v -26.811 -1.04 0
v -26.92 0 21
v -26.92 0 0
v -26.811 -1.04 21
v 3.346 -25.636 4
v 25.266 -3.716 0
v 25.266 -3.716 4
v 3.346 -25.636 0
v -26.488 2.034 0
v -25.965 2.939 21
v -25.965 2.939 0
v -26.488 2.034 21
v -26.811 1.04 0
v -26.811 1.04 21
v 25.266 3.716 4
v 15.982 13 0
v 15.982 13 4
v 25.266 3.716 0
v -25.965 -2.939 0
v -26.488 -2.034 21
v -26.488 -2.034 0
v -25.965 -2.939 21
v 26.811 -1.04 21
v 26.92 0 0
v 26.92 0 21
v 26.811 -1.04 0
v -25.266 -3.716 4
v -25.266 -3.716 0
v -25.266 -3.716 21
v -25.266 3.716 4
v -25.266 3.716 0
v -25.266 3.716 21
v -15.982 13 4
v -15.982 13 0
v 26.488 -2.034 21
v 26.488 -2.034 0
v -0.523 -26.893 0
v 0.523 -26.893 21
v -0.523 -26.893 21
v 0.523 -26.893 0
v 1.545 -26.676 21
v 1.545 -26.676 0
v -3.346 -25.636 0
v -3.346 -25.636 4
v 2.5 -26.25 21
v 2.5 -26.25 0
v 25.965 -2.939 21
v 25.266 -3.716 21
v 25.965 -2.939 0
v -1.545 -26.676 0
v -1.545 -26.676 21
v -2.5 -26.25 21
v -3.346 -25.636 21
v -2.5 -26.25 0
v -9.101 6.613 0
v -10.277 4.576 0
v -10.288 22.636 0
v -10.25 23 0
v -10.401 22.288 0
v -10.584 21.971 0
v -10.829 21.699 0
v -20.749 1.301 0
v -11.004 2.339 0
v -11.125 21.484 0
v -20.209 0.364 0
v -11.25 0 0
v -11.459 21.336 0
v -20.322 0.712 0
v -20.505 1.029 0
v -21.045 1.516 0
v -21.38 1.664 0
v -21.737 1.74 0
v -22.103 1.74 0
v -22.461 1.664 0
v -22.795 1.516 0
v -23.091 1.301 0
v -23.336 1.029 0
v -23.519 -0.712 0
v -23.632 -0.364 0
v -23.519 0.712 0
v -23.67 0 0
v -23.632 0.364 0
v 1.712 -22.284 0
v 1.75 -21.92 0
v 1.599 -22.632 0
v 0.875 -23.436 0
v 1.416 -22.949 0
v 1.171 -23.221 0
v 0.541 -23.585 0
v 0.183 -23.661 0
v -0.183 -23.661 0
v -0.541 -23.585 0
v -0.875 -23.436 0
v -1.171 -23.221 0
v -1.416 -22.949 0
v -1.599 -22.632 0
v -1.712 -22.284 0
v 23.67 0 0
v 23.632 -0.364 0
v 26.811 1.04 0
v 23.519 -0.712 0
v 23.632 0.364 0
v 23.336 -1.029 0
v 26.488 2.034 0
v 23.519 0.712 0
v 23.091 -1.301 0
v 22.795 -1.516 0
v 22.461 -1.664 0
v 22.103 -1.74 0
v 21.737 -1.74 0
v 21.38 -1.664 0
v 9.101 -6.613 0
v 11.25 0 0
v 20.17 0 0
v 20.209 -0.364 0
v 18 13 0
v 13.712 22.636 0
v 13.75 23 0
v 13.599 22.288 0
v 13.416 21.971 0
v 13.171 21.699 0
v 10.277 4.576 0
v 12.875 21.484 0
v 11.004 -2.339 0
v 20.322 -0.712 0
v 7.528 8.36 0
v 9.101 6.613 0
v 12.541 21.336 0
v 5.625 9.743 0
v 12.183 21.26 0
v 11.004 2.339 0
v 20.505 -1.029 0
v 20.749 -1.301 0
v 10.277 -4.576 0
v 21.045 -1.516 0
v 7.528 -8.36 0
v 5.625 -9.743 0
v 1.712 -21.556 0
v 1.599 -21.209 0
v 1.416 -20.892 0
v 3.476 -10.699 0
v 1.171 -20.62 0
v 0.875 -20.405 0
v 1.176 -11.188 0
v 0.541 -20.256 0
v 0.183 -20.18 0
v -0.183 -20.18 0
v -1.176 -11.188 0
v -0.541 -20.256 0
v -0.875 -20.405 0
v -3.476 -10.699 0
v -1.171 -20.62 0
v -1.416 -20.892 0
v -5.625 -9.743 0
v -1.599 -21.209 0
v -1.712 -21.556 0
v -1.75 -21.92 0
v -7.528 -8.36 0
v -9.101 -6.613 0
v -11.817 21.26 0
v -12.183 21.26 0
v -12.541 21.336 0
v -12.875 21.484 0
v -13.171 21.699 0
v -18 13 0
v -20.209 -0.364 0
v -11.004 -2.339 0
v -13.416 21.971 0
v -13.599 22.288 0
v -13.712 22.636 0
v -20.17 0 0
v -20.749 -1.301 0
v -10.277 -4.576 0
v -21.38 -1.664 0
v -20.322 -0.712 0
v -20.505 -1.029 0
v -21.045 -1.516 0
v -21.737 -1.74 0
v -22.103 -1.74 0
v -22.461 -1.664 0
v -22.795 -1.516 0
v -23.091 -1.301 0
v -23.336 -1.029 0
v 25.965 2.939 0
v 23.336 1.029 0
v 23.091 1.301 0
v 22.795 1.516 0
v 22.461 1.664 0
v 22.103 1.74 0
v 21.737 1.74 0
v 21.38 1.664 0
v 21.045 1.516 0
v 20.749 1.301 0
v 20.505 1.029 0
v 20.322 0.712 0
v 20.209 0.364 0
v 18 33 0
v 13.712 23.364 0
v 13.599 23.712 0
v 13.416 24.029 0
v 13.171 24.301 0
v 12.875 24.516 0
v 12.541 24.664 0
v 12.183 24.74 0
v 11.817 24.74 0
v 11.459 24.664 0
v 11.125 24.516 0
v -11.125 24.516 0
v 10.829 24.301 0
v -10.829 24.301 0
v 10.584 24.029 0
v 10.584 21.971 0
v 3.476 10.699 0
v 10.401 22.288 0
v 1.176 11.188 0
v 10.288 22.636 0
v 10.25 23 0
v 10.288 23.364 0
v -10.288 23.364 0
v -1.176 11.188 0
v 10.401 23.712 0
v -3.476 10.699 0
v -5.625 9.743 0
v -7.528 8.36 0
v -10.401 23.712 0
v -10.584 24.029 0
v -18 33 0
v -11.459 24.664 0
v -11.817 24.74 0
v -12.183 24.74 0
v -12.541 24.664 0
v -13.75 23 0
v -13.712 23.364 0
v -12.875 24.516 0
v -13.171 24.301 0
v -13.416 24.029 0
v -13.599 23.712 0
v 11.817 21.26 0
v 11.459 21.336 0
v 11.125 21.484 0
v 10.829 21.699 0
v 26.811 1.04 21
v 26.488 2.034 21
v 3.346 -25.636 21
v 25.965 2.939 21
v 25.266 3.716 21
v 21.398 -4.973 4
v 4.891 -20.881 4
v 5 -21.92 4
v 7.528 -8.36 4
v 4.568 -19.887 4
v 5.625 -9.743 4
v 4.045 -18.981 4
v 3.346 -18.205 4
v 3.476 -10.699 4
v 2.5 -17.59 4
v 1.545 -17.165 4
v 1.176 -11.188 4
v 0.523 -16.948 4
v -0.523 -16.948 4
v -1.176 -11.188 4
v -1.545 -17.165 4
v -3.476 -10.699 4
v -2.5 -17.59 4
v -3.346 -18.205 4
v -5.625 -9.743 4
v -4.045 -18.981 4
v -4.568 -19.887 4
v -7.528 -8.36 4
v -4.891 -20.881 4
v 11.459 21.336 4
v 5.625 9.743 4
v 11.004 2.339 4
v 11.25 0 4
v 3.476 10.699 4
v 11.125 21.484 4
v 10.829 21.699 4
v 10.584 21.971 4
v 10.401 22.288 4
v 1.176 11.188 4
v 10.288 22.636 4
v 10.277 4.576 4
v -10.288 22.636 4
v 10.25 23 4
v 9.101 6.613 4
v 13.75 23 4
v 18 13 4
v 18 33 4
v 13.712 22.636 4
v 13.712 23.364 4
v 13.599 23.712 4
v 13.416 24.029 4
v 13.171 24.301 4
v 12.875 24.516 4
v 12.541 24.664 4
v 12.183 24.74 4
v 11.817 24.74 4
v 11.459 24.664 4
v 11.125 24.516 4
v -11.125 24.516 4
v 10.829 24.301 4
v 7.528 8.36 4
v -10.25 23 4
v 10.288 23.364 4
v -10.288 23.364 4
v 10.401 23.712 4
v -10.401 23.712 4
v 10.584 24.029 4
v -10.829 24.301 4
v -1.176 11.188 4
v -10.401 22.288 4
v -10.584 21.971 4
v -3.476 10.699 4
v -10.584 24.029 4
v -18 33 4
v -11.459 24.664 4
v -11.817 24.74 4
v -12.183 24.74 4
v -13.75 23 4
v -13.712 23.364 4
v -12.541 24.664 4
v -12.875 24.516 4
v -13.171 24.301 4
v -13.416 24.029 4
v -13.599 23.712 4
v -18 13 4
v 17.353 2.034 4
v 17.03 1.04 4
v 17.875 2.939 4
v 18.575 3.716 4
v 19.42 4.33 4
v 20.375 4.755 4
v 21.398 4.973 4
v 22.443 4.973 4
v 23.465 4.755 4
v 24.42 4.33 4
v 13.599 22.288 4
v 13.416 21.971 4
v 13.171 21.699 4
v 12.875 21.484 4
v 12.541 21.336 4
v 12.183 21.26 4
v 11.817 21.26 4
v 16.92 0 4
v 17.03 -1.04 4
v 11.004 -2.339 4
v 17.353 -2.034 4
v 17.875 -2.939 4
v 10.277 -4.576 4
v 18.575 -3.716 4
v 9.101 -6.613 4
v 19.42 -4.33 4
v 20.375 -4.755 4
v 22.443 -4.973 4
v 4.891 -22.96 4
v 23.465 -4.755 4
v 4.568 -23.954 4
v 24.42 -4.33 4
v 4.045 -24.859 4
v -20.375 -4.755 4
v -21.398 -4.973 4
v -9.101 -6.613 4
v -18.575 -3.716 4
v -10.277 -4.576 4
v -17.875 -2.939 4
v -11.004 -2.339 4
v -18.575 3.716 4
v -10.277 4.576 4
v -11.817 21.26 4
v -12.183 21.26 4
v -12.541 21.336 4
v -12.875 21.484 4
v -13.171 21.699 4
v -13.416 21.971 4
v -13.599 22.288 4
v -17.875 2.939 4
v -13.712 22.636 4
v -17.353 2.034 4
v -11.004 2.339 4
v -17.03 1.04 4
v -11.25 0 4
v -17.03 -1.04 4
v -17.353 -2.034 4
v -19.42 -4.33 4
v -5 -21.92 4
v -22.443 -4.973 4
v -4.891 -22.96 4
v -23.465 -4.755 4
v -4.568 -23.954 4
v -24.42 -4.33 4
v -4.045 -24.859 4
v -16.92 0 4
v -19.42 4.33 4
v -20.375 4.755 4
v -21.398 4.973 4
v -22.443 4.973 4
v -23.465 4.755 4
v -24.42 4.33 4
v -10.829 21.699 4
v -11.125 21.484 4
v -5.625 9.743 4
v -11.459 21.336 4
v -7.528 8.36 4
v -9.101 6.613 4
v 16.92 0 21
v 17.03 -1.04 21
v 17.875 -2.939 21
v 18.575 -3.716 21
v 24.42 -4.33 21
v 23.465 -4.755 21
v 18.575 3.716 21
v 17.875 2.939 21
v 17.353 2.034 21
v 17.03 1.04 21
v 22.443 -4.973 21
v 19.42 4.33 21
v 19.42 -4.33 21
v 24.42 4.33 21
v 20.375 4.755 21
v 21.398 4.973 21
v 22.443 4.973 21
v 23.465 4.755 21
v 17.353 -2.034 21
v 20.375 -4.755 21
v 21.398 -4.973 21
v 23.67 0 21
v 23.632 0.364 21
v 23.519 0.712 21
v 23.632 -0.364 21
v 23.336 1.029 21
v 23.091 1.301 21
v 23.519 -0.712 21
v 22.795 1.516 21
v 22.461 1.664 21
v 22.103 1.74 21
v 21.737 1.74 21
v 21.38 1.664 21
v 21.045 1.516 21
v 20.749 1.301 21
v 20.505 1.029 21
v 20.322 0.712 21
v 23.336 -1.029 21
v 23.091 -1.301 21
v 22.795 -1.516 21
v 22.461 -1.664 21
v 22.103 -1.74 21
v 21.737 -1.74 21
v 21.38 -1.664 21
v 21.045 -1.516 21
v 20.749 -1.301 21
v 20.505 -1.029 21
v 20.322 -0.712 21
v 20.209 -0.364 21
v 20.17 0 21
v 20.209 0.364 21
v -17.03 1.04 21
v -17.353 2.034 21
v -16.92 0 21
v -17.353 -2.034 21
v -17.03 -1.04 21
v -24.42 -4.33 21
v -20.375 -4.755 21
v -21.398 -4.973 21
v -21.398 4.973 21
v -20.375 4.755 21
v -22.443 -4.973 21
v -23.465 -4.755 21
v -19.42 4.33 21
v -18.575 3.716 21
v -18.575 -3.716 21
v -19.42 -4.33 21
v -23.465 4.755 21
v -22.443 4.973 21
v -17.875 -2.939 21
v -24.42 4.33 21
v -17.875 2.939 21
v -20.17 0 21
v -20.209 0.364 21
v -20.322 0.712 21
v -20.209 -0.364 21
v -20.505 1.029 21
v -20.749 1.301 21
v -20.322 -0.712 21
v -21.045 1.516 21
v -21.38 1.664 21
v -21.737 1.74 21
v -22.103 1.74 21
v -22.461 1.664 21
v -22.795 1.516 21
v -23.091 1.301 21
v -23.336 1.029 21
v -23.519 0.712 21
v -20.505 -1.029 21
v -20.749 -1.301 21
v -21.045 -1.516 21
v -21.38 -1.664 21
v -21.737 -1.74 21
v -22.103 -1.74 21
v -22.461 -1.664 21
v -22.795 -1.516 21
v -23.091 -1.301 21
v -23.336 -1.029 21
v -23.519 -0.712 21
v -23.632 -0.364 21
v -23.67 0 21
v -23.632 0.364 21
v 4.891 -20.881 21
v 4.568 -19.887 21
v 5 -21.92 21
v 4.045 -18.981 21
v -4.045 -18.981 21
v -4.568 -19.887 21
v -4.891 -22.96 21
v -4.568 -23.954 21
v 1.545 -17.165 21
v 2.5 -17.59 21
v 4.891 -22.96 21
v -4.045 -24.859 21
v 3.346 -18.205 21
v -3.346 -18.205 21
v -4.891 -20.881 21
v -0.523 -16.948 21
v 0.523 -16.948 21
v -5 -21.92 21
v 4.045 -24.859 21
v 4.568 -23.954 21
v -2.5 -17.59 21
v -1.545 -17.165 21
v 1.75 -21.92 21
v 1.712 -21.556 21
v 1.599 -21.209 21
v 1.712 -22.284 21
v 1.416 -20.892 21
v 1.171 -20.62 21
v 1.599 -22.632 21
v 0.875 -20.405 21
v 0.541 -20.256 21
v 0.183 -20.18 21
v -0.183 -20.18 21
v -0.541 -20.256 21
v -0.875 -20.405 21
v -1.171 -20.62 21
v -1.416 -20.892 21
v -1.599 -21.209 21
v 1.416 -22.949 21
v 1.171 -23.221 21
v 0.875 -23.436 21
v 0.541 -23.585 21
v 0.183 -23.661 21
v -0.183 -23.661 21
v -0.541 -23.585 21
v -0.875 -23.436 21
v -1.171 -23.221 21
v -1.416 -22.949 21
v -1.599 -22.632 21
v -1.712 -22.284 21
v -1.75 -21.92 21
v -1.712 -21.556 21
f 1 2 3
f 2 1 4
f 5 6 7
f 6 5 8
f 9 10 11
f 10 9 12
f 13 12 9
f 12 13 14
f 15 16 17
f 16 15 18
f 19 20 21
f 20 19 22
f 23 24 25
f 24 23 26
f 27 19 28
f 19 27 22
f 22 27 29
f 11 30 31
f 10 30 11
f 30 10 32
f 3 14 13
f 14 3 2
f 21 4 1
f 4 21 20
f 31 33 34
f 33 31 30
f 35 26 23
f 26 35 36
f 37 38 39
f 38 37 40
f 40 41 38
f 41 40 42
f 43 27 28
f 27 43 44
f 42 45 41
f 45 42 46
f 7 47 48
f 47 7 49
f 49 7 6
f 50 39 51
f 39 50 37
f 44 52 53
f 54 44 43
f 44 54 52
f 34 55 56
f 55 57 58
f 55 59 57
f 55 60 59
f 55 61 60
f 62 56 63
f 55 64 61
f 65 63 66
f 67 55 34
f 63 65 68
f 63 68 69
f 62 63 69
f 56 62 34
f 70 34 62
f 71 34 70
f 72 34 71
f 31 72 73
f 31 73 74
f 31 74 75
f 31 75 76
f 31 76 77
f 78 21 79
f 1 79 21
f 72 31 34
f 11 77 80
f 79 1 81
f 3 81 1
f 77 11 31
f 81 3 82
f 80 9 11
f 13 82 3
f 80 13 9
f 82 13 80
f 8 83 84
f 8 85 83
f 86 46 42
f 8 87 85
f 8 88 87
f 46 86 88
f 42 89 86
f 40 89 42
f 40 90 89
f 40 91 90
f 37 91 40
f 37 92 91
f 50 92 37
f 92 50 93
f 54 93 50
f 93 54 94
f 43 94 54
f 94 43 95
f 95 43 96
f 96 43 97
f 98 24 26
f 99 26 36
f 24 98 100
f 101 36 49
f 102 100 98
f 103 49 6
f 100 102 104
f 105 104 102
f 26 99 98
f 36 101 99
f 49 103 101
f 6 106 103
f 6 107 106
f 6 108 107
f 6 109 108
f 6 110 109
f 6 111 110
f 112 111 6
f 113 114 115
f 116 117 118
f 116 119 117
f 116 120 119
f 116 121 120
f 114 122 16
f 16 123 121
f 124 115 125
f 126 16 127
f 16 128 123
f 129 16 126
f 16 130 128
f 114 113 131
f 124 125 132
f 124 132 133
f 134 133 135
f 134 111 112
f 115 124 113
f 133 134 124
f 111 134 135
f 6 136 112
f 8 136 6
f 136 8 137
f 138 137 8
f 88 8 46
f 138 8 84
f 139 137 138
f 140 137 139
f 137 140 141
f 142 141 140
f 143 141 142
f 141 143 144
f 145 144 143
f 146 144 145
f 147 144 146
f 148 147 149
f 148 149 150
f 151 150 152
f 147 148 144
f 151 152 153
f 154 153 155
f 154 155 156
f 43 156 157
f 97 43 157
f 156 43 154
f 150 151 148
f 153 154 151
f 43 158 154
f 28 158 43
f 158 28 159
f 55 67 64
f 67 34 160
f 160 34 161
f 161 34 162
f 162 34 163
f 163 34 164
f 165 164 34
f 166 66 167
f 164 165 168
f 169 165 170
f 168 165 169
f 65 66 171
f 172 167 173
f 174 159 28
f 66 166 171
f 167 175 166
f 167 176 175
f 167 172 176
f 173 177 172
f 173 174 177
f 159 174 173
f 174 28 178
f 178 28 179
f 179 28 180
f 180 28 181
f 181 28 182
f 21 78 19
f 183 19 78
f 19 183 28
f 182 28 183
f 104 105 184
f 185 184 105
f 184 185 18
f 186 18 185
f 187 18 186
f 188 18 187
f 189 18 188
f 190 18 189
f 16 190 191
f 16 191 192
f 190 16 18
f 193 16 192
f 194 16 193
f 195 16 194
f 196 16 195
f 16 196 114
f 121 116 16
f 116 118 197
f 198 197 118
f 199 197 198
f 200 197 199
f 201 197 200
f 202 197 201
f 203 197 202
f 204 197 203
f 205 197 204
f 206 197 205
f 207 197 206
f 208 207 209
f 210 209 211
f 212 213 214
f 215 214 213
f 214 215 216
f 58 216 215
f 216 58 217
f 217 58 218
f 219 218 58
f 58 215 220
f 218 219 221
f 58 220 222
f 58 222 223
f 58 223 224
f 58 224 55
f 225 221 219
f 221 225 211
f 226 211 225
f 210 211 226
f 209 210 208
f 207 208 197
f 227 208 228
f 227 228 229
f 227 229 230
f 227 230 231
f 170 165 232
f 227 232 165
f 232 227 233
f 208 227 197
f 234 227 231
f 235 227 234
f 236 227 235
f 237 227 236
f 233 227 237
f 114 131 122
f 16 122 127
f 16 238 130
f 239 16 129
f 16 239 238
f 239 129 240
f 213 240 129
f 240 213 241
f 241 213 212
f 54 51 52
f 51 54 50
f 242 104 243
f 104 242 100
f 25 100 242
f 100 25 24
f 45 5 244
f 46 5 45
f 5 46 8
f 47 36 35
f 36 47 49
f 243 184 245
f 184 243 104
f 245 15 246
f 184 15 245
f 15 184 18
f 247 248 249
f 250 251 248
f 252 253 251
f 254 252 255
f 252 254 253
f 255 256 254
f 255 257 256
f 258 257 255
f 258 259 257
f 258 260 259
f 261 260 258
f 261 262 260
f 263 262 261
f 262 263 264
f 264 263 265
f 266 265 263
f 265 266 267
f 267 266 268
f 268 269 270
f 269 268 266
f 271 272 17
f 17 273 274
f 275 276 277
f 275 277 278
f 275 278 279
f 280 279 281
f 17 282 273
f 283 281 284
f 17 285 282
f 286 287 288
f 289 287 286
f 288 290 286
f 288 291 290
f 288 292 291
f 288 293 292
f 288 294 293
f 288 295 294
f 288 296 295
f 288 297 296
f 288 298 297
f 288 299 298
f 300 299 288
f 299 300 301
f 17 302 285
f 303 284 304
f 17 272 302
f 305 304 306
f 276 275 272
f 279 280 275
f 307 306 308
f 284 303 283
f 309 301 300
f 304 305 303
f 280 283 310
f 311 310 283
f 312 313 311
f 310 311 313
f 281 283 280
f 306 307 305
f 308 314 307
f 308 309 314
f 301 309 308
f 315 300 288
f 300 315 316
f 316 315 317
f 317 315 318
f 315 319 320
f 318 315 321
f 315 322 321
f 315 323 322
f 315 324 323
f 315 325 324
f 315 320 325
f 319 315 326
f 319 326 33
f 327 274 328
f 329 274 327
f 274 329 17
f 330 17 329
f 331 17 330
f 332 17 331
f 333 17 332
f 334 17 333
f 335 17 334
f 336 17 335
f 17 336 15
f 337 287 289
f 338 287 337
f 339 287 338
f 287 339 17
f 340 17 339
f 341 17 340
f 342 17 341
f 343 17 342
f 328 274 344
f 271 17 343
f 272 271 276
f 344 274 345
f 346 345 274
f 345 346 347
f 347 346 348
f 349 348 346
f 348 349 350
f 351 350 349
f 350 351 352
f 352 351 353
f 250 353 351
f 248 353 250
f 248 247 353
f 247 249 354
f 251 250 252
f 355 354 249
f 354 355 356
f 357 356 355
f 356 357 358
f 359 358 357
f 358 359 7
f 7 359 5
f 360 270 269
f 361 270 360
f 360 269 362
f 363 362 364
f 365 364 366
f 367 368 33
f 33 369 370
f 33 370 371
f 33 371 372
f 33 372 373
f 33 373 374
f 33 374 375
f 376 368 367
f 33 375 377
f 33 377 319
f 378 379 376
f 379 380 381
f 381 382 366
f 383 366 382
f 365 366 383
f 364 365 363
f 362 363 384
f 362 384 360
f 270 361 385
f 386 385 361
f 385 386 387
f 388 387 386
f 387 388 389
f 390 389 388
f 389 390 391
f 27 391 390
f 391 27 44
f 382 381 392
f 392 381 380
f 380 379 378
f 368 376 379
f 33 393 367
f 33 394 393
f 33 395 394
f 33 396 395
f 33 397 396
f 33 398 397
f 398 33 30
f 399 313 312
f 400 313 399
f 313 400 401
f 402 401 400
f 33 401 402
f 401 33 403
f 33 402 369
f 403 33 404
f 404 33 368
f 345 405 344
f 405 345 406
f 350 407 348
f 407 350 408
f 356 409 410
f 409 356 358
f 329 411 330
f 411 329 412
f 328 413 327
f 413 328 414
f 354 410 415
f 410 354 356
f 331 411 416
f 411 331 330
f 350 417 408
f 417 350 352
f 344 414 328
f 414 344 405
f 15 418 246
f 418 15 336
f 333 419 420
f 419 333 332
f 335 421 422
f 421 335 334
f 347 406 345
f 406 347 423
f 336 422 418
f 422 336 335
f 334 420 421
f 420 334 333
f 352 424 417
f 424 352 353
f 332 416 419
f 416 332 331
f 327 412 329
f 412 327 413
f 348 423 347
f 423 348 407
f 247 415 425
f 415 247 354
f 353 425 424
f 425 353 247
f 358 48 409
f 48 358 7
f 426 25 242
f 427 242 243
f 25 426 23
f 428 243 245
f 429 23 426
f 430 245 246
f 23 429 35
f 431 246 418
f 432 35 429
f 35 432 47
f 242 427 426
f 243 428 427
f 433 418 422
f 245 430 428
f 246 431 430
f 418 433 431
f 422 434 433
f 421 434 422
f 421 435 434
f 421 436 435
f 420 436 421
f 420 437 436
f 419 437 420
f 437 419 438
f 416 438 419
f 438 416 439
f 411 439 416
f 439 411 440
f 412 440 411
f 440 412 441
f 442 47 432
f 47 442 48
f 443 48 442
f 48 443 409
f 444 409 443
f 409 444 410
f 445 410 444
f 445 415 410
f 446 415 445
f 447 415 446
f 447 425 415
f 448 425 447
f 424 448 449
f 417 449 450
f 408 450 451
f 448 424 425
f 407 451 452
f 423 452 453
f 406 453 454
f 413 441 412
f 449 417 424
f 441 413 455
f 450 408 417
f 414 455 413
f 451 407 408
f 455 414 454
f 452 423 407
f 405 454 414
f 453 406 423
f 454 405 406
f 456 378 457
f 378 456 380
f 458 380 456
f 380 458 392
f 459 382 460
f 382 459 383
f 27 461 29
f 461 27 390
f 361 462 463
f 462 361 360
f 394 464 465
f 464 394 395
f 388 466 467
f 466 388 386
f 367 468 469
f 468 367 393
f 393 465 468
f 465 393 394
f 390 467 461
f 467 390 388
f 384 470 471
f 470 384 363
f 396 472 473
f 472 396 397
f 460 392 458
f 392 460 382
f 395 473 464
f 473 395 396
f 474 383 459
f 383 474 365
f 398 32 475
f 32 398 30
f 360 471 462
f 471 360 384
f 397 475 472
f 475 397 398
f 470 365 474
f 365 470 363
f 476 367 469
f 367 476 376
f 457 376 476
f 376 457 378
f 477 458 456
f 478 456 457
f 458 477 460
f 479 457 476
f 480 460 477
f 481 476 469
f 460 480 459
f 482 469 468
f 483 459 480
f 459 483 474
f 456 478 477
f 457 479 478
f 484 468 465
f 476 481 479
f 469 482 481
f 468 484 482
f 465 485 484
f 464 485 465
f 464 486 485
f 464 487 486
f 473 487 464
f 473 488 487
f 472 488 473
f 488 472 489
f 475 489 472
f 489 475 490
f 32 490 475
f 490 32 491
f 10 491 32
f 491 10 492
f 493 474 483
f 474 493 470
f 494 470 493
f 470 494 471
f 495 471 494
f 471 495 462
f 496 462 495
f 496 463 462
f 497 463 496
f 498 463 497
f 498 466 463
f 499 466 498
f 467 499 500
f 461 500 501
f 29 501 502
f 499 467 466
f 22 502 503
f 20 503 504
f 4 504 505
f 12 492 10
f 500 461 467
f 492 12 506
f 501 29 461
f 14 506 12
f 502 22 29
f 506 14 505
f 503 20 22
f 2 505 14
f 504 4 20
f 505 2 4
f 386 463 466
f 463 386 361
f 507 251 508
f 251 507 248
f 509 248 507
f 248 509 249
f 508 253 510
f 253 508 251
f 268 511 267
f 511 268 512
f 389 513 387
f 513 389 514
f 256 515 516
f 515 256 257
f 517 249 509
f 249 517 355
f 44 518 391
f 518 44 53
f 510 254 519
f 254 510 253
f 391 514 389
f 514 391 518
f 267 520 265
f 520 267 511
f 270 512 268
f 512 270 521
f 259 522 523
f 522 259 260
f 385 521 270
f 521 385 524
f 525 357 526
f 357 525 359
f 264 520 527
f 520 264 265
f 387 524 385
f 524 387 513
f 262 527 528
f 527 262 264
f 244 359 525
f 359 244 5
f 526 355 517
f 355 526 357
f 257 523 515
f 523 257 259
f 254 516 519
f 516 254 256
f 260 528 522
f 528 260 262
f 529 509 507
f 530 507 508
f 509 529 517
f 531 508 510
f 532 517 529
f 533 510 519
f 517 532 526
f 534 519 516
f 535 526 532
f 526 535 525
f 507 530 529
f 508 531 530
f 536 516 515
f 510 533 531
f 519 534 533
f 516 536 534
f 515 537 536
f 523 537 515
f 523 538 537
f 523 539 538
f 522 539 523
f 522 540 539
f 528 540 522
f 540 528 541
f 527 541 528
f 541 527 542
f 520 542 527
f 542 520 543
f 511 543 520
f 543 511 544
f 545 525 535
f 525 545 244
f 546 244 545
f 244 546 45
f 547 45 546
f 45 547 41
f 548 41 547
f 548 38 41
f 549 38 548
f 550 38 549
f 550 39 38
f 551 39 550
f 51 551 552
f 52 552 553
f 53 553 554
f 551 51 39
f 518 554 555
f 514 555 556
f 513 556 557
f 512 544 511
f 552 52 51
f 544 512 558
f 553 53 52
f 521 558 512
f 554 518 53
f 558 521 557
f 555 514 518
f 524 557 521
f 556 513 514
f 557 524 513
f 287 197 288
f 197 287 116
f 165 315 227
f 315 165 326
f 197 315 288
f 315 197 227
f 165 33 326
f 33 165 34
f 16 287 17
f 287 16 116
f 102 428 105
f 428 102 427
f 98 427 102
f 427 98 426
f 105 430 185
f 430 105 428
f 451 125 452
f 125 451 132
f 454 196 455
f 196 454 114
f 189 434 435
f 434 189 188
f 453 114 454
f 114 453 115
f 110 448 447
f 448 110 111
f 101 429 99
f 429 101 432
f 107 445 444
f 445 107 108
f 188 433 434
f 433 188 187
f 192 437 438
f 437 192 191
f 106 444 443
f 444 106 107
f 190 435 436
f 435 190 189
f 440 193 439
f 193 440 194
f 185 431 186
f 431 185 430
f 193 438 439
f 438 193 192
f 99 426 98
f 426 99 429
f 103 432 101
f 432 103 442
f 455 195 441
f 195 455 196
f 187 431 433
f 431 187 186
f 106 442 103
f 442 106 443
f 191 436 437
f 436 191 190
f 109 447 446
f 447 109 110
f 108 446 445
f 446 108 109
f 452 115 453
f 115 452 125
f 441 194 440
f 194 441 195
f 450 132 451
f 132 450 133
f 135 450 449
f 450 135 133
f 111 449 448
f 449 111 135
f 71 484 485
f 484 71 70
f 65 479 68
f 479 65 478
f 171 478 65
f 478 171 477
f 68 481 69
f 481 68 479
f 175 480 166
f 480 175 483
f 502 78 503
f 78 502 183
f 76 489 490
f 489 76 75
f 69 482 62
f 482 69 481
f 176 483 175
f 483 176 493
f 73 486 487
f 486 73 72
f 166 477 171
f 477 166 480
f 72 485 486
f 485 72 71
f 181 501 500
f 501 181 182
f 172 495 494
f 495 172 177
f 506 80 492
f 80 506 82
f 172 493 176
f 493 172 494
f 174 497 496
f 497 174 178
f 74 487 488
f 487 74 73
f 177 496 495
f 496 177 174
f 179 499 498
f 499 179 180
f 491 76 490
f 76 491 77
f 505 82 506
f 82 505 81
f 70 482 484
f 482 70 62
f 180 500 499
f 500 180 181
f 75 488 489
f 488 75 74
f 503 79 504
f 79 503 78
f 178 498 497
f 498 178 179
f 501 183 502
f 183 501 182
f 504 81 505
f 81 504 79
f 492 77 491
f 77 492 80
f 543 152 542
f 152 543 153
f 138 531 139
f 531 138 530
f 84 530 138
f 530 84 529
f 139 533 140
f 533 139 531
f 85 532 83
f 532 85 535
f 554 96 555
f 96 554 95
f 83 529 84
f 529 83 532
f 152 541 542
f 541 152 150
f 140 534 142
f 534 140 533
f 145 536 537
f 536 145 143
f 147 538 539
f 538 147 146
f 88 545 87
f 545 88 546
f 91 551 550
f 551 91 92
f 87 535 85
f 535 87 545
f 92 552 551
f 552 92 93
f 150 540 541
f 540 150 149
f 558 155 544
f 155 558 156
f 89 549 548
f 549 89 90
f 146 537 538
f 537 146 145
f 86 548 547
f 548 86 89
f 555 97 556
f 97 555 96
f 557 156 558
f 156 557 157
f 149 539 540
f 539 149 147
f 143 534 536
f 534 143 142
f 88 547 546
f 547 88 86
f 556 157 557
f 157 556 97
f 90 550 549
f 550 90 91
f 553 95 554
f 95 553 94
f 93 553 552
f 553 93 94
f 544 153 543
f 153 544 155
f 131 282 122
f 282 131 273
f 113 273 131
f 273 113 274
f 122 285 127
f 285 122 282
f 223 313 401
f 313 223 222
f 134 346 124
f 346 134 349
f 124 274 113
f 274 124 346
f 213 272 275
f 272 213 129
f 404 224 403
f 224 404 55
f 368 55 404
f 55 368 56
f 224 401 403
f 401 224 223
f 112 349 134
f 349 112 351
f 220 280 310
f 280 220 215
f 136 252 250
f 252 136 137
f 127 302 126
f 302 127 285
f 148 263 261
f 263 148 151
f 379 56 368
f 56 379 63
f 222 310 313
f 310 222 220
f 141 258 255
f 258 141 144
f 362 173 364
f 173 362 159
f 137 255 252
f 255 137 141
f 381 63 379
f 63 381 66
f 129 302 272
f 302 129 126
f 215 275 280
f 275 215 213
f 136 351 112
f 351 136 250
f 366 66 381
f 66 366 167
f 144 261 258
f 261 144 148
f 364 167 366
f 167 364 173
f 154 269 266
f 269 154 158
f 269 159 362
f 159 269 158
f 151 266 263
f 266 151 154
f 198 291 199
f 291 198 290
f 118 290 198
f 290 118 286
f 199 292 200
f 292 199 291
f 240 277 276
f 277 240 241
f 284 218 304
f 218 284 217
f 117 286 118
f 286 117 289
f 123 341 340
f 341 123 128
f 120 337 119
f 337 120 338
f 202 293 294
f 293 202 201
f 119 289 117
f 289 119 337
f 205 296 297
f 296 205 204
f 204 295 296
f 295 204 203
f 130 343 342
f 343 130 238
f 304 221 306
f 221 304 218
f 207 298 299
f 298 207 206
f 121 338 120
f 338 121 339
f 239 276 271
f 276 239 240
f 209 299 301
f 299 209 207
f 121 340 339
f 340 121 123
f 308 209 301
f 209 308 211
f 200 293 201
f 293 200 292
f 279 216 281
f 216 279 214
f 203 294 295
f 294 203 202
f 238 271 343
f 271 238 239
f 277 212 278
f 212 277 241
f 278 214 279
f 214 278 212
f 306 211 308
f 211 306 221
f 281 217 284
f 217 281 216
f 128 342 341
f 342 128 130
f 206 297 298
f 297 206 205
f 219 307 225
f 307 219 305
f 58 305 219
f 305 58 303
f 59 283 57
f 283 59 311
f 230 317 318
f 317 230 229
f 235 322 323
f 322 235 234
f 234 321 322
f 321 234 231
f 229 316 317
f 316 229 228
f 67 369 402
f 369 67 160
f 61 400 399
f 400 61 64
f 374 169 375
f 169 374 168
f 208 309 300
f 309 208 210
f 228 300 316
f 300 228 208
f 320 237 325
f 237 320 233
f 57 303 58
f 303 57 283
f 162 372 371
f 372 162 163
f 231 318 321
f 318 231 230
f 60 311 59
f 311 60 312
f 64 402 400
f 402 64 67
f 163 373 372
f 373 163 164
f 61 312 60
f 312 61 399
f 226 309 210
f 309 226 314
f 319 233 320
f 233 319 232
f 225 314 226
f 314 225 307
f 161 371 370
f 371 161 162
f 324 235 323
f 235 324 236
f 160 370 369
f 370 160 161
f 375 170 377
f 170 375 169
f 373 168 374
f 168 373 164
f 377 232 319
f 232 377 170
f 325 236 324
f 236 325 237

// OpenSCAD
nema_screw_dist = 43.840620434/2;

axle_d = 13;

screw = 3.5;
screw_wall = 10;
screw_res = 30;
space = 17;

plate = 4;
frame = 20;
difference() {
    union() {
        hull() {
            translate([nema_screw_dist, 0, 0])cylinder(d=screw_wall, h = plate, $fn=screw_res);
            translate([-nema_screw_dist, 0, 0])cylinder(d=screw_wall, h = plate, $fn=screw_res);
            translate([0, -nema_screw_dist, 0])cylinder(d=screw_wall, h = plate, $fn=screw_res);
            translate([0, nema_screw_dist, 0])cylinder(d=screw_wall, h = plate, $fn=screw_res);
            //translate([18, axle_d, 0]) cube([1,frame,plate]);
            //translate([-18, axle_d, 0]) cube([1,frame,plate]);
        }
        // rising poles
        translate([nema_screw_dist, 0, 0])cylinder(d=screw_wall, h = plate+space, $fn=screw_res);
        translate([-nema_screw_dist, 0, 0])cylinder(d=screw_wall, h = plate+space, $fn=screw_res);
        translate([0, -nema_screw_dist, 0])cylinder(d=screw_wall, h = plate+space, $fn=screw_res);
        //frame mount plate
        translate([-18, axle_d, 0]) cube([18*2,frame,plate]);
    }
    translate([nema_screw_dist, 0, 0])cylinder(d=screw, h = plate+space, $fn=screw_res);
    translate([-nema_screw_dist, 0, 0])cylinder(d=screw, h = plate+space, $fn=screw_res);
    translate([0, -nema_screw_dist, 0])cylinder(d=screw, h = plate+space, $fn=screw_res);
    translate([0, 0, 0])cylinder(d=22.5, h = plate, $fn=screw_res);
    translate([18, axle_d, -1]) cube([frame,frame,plate+2]);
    translate([-18-frame, axle_d, -1]) cube([frame,frame,plate+2]);
    
    //frame screw holes
    translate([18-6,axle_d+frame/2 , 0])cylinder(d=screw, h = plate, $fn=screw_res);
    translate([-18+6,axle_d+frame/2 , 0])cylinder(d=screw, h = plate, $fn=screw_res);
}
